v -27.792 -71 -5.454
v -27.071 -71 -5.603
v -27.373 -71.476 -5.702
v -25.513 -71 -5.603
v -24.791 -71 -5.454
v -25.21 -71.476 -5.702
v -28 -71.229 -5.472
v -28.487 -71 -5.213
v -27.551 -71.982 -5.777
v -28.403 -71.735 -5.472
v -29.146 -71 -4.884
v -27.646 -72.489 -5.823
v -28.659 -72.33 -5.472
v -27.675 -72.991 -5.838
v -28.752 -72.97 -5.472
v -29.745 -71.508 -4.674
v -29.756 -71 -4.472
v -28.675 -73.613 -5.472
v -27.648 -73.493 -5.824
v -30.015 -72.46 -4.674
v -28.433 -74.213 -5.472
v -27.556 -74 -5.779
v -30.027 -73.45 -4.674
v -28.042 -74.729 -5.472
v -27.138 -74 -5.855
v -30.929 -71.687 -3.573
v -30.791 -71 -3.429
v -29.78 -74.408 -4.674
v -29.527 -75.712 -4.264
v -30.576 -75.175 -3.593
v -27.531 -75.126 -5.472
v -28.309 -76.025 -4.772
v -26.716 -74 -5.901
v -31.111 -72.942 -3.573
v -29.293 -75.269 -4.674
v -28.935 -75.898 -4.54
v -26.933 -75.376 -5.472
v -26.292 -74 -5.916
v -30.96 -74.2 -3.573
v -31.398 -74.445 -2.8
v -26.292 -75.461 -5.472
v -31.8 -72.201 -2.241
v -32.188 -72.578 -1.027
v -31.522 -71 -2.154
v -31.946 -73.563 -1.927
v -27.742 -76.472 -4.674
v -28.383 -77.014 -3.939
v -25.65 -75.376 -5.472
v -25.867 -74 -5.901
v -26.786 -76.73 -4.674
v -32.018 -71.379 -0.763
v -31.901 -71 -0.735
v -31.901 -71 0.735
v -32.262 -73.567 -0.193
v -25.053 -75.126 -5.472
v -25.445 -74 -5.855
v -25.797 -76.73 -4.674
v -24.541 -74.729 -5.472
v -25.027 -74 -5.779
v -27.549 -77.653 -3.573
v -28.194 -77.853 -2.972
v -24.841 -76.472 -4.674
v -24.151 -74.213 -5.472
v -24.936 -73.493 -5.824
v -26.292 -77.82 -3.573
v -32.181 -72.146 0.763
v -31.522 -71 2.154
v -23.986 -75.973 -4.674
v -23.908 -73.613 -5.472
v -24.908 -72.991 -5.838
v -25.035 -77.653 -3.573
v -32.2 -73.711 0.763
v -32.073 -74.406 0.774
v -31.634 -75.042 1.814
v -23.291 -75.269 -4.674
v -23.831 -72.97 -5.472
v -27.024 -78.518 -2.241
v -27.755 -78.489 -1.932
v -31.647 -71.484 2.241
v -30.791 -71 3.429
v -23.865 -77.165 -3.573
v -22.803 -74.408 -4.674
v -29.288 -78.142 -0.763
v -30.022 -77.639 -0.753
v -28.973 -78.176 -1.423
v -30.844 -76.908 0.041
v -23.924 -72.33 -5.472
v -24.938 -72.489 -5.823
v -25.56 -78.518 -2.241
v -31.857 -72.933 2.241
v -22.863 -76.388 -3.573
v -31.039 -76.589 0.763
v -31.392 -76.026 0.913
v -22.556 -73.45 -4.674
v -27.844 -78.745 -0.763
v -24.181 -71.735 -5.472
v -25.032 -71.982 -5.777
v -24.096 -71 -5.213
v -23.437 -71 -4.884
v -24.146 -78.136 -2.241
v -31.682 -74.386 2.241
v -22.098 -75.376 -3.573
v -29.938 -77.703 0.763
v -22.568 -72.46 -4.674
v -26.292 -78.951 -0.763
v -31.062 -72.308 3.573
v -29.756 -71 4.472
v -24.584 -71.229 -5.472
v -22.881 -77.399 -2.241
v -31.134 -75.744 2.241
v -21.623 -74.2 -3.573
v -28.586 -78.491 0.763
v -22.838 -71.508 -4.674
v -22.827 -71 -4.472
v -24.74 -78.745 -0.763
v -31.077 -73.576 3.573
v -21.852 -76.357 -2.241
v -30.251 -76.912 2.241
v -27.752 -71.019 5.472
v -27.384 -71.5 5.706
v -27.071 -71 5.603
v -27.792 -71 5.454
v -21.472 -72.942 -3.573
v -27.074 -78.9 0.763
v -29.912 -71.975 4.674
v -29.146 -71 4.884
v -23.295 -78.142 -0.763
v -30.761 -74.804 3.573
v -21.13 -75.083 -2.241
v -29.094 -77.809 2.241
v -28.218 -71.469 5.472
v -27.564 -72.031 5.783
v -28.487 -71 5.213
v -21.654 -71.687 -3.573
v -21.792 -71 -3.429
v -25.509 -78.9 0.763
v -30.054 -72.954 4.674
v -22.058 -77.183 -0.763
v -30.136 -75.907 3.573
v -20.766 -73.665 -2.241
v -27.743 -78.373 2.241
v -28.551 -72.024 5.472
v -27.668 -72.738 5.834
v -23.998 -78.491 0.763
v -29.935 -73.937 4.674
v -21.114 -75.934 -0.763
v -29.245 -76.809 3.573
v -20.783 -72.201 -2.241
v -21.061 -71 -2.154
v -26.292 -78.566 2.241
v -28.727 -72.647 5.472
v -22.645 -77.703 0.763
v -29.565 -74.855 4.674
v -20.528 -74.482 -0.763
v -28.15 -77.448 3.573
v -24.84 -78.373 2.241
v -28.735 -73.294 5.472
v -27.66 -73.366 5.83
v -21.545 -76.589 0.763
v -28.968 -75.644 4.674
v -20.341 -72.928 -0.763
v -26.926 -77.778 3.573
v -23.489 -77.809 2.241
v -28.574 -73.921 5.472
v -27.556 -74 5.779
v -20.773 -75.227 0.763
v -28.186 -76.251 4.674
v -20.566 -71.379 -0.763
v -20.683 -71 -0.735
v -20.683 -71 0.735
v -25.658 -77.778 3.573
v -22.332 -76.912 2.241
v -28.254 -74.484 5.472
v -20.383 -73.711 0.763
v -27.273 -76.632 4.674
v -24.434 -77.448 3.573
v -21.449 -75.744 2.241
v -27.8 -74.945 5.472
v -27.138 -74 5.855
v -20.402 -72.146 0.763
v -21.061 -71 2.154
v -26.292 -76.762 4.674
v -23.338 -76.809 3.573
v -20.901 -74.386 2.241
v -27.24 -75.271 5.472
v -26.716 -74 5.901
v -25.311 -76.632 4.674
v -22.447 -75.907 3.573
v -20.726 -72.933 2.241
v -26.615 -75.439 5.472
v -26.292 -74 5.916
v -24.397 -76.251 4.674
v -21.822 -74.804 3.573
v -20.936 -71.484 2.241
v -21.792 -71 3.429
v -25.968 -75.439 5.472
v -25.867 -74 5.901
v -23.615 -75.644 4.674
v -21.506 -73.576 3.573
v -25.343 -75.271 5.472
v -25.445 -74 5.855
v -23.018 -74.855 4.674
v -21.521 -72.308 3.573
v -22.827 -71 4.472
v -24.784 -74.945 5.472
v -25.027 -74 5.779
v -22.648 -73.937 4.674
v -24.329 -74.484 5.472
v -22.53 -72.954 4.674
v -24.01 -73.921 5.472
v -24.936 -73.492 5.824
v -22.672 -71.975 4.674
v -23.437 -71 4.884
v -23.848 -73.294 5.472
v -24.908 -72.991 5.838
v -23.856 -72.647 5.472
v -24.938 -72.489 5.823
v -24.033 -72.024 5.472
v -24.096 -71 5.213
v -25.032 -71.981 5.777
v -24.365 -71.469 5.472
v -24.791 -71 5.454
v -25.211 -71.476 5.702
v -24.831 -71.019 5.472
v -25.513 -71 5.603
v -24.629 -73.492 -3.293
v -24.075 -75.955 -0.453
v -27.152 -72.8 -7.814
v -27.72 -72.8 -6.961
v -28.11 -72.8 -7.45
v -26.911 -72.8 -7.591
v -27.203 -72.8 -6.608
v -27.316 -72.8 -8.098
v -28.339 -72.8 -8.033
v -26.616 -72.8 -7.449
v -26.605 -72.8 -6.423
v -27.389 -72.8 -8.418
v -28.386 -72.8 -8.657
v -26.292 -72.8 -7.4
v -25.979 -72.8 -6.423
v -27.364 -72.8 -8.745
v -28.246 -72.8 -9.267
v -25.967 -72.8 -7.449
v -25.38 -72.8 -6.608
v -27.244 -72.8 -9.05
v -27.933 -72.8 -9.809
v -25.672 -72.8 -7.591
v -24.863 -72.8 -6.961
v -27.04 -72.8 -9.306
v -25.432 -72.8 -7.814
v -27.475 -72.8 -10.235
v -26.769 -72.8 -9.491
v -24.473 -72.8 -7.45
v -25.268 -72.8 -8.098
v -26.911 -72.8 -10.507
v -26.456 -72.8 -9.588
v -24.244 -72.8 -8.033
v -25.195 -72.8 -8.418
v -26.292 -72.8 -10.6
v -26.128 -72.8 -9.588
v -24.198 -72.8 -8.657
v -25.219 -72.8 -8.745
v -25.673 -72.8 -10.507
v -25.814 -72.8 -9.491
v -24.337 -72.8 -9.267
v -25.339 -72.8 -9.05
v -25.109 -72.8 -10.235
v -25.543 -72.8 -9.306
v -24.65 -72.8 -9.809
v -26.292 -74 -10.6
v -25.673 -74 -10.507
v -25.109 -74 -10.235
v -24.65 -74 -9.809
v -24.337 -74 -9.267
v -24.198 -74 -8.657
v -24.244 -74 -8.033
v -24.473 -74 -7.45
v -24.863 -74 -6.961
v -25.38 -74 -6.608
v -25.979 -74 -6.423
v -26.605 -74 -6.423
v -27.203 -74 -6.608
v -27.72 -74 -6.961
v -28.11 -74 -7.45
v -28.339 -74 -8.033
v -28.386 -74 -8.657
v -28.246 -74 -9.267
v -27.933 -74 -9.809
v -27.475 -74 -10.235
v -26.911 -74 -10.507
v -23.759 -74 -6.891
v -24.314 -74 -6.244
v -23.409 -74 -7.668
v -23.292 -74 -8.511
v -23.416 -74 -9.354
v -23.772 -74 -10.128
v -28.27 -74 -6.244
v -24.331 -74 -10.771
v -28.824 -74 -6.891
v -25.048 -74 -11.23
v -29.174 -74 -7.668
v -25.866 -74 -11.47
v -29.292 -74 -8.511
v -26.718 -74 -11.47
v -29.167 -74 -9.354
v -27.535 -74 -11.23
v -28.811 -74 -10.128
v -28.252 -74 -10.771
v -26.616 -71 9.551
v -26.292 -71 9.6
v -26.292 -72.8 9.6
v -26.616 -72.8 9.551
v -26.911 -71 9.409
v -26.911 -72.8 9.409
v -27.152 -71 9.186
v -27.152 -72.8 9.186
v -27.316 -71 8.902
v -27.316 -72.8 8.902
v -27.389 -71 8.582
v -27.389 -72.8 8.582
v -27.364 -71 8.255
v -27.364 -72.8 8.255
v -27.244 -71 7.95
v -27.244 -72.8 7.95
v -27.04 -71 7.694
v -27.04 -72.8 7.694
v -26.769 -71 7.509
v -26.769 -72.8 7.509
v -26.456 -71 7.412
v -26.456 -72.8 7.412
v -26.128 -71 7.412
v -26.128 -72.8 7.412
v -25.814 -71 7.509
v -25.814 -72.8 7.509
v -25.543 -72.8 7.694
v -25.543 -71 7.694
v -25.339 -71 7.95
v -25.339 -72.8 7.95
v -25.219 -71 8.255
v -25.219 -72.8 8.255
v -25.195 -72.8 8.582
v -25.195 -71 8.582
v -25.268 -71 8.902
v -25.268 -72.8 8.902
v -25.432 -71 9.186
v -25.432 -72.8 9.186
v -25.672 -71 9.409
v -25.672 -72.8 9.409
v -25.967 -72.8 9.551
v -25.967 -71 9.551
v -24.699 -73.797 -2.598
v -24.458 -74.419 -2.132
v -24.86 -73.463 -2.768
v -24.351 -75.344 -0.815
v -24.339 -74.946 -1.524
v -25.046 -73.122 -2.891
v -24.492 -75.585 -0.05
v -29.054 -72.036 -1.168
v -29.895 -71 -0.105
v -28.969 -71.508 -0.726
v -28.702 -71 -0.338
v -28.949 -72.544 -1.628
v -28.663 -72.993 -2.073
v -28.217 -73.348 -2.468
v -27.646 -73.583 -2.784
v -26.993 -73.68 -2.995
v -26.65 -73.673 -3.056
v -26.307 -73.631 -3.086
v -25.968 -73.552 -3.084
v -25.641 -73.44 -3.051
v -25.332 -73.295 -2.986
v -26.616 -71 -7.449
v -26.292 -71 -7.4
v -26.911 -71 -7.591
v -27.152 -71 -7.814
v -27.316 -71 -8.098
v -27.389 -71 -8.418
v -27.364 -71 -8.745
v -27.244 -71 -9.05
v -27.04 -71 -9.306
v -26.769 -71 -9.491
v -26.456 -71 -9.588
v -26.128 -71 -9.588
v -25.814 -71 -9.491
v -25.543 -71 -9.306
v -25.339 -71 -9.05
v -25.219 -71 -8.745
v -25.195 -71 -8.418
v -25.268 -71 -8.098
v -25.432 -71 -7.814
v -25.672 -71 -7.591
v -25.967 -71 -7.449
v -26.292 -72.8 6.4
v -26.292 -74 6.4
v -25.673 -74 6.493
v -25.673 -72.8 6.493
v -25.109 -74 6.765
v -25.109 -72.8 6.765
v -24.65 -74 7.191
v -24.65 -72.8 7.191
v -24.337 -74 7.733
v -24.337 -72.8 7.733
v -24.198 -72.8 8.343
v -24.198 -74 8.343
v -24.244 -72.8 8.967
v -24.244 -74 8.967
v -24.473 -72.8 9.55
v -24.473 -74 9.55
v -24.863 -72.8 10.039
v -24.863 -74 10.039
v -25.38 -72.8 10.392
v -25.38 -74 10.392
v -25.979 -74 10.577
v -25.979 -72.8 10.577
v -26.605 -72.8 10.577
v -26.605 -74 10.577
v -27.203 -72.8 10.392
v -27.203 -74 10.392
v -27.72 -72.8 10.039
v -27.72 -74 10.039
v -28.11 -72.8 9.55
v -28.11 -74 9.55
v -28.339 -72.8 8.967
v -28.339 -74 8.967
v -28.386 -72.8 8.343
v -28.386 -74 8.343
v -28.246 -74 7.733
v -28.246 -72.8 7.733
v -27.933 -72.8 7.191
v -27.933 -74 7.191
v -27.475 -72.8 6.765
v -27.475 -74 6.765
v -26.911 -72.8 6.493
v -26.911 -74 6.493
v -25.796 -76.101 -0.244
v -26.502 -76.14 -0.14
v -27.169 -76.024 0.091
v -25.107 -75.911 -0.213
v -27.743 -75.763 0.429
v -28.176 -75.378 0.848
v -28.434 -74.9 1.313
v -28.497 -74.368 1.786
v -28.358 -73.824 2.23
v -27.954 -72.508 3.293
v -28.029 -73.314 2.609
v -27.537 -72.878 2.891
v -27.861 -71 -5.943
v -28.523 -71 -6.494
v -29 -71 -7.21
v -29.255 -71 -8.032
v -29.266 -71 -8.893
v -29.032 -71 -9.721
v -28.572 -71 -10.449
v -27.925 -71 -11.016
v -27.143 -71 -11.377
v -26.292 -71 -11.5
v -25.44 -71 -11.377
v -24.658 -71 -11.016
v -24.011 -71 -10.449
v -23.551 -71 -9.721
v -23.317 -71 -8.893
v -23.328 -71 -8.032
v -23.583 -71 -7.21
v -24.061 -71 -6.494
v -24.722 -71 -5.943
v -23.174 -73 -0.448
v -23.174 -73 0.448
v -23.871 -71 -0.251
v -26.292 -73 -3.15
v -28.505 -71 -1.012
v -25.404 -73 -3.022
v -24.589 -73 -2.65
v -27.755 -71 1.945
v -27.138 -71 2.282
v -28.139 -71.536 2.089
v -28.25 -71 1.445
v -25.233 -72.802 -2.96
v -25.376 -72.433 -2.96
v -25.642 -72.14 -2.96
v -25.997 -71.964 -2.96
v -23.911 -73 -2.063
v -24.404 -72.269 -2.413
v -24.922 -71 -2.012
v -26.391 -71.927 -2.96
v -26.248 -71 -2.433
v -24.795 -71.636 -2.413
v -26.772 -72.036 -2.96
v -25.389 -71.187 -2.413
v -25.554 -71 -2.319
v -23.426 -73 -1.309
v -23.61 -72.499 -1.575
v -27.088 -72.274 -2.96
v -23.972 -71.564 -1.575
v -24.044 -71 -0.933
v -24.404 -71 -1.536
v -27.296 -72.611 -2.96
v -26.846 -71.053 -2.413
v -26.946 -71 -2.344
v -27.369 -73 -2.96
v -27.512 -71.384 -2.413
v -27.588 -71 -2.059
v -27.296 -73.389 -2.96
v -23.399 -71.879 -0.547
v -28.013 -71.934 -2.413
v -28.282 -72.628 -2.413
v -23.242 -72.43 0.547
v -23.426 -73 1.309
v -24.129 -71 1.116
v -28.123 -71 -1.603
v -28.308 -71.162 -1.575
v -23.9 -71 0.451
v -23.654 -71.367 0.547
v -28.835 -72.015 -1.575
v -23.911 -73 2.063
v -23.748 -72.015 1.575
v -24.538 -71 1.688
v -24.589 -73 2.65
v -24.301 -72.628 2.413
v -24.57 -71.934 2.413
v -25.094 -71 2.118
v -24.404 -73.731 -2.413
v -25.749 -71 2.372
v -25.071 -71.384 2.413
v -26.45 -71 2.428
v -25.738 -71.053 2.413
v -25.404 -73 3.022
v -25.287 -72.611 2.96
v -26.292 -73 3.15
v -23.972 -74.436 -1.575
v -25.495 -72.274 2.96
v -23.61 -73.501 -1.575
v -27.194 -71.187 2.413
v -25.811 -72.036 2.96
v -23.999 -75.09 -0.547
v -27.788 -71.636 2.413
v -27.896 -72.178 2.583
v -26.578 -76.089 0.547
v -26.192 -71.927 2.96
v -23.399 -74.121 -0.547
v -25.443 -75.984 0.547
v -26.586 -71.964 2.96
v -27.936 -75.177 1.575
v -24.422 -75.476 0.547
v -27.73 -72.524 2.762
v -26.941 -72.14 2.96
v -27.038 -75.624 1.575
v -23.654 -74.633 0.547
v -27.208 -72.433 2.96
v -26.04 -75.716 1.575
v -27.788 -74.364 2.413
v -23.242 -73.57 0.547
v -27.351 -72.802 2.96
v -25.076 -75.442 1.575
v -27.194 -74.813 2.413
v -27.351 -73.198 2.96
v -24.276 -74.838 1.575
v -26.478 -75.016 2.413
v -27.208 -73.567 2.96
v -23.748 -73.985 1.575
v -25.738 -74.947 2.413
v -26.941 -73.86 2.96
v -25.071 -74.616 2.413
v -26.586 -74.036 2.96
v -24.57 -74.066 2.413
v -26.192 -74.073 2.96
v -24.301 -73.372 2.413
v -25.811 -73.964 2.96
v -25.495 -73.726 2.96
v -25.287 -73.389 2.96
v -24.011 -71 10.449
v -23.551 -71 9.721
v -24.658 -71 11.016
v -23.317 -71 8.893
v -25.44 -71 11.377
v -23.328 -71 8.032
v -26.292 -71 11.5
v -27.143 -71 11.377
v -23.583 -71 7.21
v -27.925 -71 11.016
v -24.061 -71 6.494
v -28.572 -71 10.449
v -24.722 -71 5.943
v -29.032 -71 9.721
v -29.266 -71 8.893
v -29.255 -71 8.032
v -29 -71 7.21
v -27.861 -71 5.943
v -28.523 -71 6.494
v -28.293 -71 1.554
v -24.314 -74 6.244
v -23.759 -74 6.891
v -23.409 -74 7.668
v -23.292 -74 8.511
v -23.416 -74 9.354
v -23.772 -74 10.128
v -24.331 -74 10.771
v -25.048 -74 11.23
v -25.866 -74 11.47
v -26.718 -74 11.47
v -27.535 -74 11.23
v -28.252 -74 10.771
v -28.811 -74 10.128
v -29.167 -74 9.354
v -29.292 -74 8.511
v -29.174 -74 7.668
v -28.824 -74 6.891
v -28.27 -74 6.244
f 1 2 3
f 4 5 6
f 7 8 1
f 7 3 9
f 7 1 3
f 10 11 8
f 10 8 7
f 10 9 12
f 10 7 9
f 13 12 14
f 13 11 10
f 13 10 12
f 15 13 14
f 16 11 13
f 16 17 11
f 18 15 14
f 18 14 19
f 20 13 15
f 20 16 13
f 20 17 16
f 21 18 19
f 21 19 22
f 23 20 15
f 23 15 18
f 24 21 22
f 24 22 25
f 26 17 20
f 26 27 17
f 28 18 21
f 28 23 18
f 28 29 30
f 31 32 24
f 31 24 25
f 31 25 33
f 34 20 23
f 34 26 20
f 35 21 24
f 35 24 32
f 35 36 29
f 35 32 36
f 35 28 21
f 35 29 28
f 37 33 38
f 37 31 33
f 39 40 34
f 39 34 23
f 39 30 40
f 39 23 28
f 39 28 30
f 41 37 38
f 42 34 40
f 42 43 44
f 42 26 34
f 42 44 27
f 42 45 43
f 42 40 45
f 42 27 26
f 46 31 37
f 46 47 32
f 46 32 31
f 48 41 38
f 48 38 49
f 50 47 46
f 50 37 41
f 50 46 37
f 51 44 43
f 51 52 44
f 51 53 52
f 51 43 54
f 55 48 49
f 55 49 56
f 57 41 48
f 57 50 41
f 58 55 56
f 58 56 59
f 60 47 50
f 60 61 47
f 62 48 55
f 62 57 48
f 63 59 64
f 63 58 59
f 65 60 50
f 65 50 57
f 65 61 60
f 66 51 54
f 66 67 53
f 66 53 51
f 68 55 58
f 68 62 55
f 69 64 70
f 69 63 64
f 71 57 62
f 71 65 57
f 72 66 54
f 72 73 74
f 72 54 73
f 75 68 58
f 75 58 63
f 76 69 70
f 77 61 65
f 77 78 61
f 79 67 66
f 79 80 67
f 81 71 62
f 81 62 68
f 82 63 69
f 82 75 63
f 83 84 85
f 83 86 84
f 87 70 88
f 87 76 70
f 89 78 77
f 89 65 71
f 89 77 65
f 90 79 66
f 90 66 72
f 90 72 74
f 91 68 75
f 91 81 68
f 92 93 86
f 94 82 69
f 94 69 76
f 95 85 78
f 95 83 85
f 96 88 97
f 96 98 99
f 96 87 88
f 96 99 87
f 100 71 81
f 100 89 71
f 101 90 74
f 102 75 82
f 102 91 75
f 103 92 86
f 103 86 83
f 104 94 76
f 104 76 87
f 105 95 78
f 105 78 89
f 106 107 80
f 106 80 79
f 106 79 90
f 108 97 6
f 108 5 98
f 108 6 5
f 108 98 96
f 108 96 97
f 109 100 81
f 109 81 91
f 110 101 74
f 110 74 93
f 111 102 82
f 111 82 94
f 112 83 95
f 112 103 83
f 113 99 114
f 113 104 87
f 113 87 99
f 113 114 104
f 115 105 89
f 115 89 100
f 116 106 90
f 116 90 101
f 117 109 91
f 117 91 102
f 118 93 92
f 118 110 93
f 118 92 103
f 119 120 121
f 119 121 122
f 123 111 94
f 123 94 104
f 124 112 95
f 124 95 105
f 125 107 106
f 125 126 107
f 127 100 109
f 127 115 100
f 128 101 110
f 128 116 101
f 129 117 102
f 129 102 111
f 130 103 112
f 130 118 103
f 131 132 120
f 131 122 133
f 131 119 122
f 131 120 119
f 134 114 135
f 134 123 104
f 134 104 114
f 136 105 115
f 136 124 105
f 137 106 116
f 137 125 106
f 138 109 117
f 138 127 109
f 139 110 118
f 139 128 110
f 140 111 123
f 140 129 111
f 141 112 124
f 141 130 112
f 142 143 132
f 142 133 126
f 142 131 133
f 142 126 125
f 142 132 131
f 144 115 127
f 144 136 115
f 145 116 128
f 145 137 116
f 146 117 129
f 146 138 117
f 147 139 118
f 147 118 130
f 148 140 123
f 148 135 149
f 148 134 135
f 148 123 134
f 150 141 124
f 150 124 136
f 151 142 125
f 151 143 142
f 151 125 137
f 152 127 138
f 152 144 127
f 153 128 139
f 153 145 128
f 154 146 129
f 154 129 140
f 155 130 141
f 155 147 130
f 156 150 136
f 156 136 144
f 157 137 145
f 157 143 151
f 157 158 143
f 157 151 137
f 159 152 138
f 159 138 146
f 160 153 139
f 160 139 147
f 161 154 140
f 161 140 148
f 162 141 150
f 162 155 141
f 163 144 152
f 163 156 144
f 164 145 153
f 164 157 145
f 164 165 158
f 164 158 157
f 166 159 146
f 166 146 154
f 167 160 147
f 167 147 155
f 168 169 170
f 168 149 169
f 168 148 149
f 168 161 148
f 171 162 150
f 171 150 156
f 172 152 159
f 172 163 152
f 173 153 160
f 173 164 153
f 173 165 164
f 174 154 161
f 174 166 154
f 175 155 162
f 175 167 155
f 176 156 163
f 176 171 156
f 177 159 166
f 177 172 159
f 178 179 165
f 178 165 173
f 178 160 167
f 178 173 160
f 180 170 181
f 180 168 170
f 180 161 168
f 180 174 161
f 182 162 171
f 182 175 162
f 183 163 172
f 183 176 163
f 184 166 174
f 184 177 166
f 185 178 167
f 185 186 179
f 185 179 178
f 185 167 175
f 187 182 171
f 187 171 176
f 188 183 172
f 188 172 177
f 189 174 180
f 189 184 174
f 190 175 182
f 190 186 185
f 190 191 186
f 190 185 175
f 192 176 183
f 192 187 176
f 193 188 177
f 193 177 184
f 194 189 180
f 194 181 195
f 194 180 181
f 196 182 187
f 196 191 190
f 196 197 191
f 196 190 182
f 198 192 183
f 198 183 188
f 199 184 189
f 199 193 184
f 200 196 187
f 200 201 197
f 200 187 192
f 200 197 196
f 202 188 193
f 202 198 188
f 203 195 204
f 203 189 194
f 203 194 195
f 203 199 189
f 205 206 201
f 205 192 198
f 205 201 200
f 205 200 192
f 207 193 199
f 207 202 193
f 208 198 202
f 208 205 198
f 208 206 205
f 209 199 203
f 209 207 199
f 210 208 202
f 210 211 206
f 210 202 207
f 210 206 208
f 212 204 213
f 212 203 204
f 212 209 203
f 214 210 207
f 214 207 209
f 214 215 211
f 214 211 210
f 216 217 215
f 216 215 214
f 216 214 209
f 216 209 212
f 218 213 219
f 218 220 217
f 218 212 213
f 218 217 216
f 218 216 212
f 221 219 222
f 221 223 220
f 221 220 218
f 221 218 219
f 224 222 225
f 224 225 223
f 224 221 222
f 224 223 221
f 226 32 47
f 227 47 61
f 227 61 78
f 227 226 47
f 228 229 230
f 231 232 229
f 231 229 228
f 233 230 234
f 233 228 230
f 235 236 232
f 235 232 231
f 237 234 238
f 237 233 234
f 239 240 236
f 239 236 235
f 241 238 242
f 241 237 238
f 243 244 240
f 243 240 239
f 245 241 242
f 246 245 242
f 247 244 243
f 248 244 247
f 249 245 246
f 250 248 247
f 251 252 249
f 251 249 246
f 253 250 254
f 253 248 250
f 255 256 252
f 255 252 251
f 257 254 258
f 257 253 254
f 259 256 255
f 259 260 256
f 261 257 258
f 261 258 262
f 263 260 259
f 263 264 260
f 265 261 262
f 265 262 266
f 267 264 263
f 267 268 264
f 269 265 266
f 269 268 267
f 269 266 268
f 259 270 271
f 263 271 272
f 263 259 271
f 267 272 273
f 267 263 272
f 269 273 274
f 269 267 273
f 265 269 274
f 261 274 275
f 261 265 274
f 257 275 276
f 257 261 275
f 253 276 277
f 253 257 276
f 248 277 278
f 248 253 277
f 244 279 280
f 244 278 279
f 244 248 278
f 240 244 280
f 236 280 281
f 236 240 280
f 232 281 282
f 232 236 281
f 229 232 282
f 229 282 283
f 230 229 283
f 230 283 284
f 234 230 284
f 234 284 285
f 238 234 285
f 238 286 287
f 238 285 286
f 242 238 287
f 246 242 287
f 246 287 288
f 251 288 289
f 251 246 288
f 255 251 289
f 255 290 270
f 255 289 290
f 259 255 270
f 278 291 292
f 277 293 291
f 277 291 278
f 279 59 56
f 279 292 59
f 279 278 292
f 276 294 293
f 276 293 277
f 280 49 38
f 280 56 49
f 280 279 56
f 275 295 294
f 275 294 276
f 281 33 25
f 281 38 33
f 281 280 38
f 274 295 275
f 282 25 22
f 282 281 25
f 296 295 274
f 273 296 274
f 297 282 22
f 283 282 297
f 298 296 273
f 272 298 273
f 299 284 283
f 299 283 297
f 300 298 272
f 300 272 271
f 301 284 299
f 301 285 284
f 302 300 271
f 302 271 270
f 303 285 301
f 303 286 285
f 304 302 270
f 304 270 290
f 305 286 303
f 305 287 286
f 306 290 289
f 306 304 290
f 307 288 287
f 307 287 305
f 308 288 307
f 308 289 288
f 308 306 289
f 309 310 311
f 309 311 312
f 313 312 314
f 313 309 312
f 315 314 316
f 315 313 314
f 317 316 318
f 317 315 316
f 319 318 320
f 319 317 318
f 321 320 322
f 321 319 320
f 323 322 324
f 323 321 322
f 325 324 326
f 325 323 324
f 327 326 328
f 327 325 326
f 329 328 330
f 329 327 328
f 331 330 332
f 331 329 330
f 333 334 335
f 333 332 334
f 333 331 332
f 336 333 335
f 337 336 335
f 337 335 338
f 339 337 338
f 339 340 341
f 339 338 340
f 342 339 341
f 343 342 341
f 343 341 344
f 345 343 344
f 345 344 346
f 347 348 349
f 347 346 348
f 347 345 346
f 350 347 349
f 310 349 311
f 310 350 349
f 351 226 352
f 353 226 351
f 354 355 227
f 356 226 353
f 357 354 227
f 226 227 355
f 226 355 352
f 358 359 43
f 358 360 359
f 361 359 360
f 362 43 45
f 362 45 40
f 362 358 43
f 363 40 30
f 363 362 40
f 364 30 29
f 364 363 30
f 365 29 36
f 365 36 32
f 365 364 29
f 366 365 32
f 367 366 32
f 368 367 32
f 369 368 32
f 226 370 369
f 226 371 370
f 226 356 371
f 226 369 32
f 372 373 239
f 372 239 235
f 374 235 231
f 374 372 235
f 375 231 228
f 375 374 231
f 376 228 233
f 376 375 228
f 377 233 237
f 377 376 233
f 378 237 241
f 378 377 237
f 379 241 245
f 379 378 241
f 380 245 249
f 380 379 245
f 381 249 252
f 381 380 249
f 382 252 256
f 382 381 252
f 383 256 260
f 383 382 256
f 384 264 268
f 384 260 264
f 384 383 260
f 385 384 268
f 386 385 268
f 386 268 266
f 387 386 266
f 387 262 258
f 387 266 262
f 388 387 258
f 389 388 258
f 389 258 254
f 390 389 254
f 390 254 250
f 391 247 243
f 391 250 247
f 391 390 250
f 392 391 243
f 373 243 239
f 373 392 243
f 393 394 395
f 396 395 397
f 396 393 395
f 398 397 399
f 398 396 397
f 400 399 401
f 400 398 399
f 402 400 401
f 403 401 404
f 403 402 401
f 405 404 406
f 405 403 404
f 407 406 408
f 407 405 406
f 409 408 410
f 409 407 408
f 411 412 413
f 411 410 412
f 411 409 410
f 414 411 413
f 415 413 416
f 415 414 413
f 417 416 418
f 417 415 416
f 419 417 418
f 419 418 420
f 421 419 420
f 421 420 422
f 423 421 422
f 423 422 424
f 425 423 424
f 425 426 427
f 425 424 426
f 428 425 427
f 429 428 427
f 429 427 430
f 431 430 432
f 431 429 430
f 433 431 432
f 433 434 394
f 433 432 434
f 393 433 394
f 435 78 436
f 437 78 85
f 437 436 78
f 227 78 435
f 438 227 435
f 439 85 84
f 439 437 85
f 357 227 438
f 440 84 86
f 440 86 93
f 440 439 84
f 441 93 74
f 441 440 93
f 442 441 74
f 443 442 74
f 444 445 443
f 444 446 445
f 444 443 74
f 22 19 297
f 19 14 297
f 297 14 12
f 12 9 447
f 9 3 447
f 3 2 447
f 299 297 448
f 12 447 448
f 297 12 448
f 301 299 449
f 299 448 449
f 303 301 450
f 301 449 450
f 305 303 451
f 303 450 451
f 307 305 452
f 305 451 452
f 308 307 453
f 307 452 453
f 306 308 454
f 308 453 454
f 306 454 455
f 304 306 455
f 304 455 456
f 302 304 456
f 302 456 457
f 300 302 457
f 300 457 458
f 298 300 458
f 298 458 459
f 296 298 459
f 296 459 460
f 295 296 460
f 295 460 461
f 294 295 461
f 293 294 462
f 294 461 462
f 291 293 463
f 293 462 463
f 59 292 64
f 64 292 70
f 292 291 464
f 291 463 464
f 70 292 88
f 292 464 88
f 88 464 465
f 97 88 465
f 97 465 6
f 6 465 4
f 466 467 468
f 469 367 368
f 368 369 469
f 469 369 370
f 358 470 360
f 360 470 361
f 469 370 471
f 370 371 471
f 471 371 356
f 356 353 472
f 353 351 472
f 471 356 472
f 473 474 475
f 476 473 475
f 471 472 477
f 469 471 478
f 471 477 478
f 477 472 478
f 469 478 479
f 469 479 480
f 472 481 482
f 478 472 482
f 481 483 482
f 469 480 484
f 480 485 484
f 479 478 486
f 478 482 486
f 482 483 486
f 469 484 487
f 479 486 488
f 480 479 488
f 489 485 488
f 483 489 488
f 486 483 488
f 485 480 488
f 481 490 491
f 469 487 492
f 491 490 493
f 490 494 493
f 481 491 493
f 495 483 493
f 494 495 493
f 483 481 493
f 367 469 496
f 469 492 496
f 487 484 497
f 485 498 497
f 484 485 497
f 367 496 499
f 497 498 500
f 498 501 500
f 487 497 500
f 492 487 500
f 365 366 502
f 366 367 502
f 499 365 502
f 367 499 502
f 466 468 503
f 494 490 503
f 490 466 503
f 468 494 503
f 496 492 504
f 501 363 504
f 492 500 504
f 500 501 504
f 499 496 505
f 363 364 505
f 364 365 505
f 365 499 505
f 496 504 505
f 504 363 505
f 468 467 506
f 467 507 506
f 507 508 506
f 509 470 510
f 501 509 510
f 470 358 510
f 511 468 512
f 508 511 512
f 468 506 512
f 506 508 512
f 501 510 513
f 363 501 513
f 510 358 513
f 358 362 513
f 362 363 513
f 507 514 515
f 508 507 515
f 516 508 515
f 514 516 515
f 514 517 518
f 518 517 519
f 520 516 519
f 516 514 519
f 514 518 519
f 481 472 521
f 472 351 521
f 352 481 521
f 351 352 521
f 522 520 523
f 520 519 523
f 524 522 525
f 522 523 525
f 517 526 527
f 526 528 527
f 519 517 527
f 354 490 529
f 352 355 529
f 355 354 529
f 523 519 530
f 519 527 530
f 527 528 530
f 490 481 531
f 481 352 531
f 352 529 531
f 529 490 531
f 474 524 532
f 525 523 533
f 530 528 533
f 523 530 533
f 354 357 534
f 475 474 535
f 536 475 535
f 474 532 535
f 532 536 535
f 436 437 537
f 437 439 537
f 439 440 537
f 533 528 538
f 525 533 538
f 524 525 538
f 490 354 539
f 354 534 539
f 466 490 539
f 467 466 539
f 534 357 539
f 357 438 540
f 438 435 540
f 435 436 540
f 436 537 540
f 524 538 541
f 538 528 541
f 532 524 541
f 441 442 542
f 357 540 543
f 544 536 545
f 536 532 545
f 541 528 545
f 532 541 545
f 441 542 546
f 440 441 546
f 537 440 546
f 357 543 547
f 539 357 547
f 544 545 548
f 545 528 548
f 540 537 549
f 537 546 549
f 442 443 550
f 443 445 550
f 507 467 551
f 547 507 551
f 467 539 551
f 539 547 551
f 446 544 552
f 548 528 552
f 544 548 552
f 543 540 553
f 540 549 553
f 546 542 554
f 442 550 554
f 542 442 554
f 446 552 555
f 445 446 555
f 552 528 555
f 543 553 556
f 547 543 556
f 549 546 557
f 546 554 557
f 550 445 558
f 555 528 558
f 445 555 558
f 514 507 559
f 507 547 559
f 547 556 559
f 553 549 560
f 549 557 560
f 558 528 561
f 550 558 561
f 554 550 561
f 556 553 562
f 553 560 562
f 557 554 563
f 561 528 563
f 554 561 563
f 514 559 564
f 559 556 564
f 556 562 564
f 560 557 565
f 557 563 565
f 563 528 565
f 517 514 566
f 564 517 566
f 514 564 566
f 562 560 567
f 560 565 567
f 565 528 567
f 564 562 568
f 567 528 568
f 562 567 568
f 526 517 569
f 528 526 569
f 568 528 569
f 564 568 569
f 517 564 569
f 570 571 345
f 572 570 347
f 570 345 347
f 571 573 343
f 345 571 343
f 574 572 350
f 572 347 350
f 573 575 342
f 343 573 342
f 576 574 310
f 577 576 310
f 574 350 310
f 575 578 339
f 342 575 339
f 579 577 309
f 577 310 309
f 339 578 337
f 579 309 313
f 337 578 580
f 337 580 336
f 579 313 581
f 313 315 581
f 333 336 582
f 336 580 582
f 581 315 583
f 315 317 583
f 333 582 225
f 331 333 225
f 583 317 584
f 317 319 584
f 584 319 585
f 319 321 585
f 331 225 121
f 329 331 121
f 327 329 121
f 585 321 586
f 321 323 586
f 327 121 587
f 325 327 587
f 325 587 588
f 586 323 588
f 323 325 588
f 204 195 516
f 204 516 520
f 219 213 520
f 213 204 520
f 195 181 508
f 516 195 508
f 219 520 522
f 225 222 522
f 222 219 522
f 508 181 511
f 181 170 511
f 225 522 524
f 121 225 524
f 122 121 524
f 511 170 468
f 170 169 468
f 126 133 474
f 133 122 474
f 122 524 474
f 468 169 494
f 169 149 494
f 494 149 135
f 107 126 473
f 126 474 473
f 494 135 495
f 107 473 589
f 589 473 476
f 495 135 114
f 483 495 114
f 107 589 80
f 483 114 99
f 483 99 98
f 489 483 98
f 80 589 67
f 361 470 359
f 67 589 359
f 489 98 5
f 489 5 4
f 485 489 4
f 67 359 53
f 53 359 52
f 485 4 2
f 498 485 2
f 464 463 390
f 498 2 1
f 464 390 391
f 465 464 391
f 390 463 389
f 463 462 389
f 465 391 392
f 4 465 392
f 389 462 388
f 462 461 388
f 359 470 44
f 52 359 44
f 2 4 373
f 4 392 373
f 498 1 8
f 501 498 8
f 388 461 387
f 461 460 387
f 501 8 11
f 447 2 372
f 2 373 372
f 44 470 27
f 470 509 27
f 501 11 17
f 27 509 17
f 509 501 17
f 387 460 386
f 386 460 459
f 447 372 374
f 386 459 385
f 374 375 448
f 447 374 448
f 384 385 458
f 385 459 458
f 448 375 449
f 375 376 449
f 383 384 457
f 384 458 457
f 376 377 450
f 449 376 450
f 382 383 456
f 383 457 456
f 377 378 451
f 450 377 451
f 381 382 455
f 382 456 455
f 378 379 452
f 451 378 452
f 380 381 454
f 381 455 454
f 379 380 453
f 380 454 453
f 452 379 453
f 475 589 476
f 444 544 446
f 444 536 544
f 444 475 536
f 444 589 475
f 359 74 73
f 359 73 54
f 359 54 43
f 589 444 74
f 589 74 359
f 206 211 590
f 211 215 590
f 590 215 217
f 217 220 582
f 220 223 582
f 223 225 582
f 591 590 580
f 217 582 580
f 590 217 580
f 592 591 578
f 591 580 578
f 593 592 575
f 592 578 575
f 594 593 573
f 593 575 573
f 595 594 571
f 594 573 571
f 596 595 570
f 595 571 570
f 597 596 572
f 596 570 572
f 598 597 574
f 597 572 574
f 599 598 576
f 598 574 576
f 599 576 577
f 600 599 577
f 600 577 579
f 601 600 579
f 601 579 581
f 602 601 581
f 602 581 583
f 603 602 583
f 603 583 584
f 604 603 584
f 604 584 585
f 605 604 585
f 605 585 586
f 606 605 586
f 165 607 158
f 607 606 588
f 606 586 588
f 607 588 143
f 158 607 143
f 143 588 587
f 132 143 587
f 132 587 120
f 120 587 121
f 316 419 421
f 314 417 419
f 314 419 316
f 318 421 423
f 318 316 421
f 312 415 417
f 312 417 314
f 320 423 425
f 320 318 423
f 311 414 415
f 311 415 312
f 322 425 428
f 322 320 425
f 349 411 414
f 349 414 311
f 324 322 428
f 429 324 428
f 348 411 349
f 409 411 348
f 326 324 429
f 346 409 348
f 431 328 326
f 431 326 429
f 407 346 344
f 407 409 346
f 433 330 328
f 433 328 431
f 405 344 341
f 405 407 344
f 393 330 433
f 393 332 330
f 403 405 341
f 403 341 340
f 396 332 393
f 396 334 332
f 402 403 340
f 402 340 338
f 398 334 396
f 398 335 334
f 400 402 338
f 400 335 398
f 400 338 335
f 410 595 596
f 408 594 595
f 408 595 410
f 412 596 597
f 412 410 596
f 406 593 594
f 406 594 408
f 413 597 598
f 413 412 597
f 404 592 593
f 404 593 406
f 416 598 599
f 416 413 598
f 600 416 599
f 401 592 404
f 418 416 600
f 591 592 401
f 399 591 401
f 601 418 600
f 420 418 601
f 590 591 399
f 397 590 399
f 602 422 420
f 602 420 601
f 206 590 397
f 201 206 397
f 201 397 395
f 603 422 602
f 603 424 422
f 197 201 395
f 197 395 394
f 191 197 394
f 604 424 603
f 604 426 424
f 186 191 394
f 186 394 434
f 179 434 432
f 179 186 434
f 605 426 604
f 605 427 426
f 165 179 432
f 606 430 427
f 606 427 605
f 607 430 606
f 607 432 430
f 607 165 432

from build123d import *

# Parameters (mm, degrees)
RETAINER_FEATURE_2_PROFILE_W = 14
RETAINER_FEATURE_2_PROFILE_H = 5
RETAINER_FEATURE_2_DEPTH     = 14
RETAINER_FEATURE_3_PROFILE_R = 3
RETAINER_FEATURE_3_DEPTH     = 3
RETAINER_FEATURE_4_PROFILE_R = 3
RETAINER_FEATURE_4_DEPTH     = 3
RETAINER_FEATURE_6_PROFILE_R = 1.1
RETAINER_FEATURE_6_DEPTH     = 4.25
RETAINER_FEATURE_7_PROFILE_R = 2.1
RETAINER_FEATURE_7_DEPTH     = 1.45
RETAINER_FEATURE_8_PROFILE_R = 1.1
RETAINER_FEATURE_8_DEPTH     = 4.25
RETAINER_FEATURE_9_PROFILE_R = 2.1
RETAINER_FEATURE_9_DEPTH     = 1.45
RETAINER_FEATURE_12_DEPTH    = 10


with BuildPart() as part:
    # Retainer Feature 1 profile → Retainer Feature 1 (revolve)
    with BuildSketch(Plane(origin=(0, -73, 0), x_dir=(-1, 0, 0), z_dir=(0, -1, 0))):
        with BuildLine():
            Line((26.291651246, -6), (26.291651246, 6))
            ThreePointArc((26.291651246, 6), (20.291651246, 0), (26.291651246, -6))
        make_face()
    revolve(axis=Axis((-26.291651246, -73, -10), (0, 0, 1)))

    # Retainer Feature 2 profile → Retainer Feature 2 (cut)
    with BuildSketch(Plane.XY.offset(-7)):
        with Locations((-26.291651246, -68.5)):
            Rectangle(RETAINER_FEATURE_2_PROFILE_W, RETAINER_FEATURE_2_PROFILE_H)
    extrude(amount=RETAINER_FEATURE_2_DEPTH, mode=Mode.SUBTRACT)

    # Retainer Feature 3 profile → Retainer Feature 3 (add)
    with BuildSketch(Plane(origin=(0, -71, 0), x_dir=(-1, 0, 0), z_dir=(0, -1, 0))):
        with Locations((26.291651246, 8.5)):
            Circle(RETAINER_FEATURE_3_PROFILE_R)
    extrude(amount=RETAINER_FEATURE_3_DEPTH)

    # Retainer Feature 4 profile → Retainer Feature 4 (add)
    with BuildSketch(Plane(origin=(0, -71, 0), x_dir=(-1, 0, 0), z_dir=(0, -1, 0))):
        with Locations((26.291651246, -8.5)):
            Circle(RETAINER_FEATURE_4_PROFILE_R)
    extrude(amount=RETAINER_FEATURE_4_DEPTH)

    # Retainer Feature 5 profile → Retainer Feature 5 (revolve, cut)
    with BuildSketch(Plane(origin=(0, -73, 0), x_dir=(-1, 0, 0), z_dir=(0, -1, 0))):
        with BuildLine():
            Line((26.291651246, -3.15), (26.291651246, 3.15))
            ThreePointArc((26.291651246, 3.15), (23.141651246, 0), (26.291651246, -3.15))
        make_face()
    revolve(axis=Axis((-26.291651246, -73, -10), (0, 0, 1)), mode=Mode.SUBTRACT)

    # Retainer Feature 6 profile → Retainer Feature 6 (cut)
    with BuildSketch(Plane(origin=(0, -70, 0), x_dir=(-1, 0, 0), z_dir=(0, -1, 0))):
        with Locations(Location((26.291651246, 8.5, 0), (0, 0, 270))):
            Circle(RETAINER_FEATURE_6_PROFILE_R)
    extrude(amount=RETAINER_FEATURE_6_DEPTH, mode=Mode.SUBTRACT)

    # Retainer Feature 7 profile → Retainer Feature 7 (cut)
    with BuildSketch(Plane(origin=(0, -72.8, 0), x_dir=(-1, 0, 0), z_dir=(0, -1, 0))):
        with Locations(Location((26.291651246, 8.5, 0), (0, 0, 90))):
            Circle(RETAINER_FEATURE_7_PROFILE_R)
    extrude(amount=RETAINER_FEATURE_7_DEPTH, mode=Mode.SUBTRACT)

    # Retainer Feature 8 profile → Retainer Feature 8 (cut)
    with BuildSketch(Plane(origin=(0, -70, 0), x_dir=(-1, 0, 0), z_dir=(0, -1, 0))):
        with Locations(Location((26.291651246, -8.5, 0), (0, 0, 270))):
            Circle(RETAINER_FEATURE_8_PROFILE_R)
    extrude(amount=RETAINER_FEATURE_8_DEPTH, mode=Mode.SUBTRACT)

    # Retainer Feature 9 profile → Retainer Feature 9 (cut)
    with BuildSketch(Plane(origin=(0, -72.8, 0), x_dir=(-1, 0, 0), z_dir=(0, -1, 0))):
        with Locations(Location((26.291651246, -8.5, 0), (0, 0, 90))):
            Circle(RETAINER_FEATURE_9_PROFILE_R)
    extrude(amount=RETAINER_FEATURE_9_DEPTH, mode=Mode.SUBTRACT)

    # Middle Right Fixed Compression Ball Reta → Retainer Feature 12 (cut)
    with BuildSketch(Plane(origin=(-46.801806266, -32.220261504, -18.815460044), x_dir=(-0.25892602820646665, -0.17825517869277457, 0.9493062747008634), z_dir=(-0.7819246728070284, -0.5383086561091627, -0.3143526631246647))):
        Polygon((20.297287002, -41.528985171), (16.35135873, -46.567799523), (19.343154751, -48.910694434), (23.289083023, -43.871880083), align=None)
    extrude(amount=RETAINER_FEATURE_12_DEPTH, mode=Mode.SUBTRACT)


solid = part.part
